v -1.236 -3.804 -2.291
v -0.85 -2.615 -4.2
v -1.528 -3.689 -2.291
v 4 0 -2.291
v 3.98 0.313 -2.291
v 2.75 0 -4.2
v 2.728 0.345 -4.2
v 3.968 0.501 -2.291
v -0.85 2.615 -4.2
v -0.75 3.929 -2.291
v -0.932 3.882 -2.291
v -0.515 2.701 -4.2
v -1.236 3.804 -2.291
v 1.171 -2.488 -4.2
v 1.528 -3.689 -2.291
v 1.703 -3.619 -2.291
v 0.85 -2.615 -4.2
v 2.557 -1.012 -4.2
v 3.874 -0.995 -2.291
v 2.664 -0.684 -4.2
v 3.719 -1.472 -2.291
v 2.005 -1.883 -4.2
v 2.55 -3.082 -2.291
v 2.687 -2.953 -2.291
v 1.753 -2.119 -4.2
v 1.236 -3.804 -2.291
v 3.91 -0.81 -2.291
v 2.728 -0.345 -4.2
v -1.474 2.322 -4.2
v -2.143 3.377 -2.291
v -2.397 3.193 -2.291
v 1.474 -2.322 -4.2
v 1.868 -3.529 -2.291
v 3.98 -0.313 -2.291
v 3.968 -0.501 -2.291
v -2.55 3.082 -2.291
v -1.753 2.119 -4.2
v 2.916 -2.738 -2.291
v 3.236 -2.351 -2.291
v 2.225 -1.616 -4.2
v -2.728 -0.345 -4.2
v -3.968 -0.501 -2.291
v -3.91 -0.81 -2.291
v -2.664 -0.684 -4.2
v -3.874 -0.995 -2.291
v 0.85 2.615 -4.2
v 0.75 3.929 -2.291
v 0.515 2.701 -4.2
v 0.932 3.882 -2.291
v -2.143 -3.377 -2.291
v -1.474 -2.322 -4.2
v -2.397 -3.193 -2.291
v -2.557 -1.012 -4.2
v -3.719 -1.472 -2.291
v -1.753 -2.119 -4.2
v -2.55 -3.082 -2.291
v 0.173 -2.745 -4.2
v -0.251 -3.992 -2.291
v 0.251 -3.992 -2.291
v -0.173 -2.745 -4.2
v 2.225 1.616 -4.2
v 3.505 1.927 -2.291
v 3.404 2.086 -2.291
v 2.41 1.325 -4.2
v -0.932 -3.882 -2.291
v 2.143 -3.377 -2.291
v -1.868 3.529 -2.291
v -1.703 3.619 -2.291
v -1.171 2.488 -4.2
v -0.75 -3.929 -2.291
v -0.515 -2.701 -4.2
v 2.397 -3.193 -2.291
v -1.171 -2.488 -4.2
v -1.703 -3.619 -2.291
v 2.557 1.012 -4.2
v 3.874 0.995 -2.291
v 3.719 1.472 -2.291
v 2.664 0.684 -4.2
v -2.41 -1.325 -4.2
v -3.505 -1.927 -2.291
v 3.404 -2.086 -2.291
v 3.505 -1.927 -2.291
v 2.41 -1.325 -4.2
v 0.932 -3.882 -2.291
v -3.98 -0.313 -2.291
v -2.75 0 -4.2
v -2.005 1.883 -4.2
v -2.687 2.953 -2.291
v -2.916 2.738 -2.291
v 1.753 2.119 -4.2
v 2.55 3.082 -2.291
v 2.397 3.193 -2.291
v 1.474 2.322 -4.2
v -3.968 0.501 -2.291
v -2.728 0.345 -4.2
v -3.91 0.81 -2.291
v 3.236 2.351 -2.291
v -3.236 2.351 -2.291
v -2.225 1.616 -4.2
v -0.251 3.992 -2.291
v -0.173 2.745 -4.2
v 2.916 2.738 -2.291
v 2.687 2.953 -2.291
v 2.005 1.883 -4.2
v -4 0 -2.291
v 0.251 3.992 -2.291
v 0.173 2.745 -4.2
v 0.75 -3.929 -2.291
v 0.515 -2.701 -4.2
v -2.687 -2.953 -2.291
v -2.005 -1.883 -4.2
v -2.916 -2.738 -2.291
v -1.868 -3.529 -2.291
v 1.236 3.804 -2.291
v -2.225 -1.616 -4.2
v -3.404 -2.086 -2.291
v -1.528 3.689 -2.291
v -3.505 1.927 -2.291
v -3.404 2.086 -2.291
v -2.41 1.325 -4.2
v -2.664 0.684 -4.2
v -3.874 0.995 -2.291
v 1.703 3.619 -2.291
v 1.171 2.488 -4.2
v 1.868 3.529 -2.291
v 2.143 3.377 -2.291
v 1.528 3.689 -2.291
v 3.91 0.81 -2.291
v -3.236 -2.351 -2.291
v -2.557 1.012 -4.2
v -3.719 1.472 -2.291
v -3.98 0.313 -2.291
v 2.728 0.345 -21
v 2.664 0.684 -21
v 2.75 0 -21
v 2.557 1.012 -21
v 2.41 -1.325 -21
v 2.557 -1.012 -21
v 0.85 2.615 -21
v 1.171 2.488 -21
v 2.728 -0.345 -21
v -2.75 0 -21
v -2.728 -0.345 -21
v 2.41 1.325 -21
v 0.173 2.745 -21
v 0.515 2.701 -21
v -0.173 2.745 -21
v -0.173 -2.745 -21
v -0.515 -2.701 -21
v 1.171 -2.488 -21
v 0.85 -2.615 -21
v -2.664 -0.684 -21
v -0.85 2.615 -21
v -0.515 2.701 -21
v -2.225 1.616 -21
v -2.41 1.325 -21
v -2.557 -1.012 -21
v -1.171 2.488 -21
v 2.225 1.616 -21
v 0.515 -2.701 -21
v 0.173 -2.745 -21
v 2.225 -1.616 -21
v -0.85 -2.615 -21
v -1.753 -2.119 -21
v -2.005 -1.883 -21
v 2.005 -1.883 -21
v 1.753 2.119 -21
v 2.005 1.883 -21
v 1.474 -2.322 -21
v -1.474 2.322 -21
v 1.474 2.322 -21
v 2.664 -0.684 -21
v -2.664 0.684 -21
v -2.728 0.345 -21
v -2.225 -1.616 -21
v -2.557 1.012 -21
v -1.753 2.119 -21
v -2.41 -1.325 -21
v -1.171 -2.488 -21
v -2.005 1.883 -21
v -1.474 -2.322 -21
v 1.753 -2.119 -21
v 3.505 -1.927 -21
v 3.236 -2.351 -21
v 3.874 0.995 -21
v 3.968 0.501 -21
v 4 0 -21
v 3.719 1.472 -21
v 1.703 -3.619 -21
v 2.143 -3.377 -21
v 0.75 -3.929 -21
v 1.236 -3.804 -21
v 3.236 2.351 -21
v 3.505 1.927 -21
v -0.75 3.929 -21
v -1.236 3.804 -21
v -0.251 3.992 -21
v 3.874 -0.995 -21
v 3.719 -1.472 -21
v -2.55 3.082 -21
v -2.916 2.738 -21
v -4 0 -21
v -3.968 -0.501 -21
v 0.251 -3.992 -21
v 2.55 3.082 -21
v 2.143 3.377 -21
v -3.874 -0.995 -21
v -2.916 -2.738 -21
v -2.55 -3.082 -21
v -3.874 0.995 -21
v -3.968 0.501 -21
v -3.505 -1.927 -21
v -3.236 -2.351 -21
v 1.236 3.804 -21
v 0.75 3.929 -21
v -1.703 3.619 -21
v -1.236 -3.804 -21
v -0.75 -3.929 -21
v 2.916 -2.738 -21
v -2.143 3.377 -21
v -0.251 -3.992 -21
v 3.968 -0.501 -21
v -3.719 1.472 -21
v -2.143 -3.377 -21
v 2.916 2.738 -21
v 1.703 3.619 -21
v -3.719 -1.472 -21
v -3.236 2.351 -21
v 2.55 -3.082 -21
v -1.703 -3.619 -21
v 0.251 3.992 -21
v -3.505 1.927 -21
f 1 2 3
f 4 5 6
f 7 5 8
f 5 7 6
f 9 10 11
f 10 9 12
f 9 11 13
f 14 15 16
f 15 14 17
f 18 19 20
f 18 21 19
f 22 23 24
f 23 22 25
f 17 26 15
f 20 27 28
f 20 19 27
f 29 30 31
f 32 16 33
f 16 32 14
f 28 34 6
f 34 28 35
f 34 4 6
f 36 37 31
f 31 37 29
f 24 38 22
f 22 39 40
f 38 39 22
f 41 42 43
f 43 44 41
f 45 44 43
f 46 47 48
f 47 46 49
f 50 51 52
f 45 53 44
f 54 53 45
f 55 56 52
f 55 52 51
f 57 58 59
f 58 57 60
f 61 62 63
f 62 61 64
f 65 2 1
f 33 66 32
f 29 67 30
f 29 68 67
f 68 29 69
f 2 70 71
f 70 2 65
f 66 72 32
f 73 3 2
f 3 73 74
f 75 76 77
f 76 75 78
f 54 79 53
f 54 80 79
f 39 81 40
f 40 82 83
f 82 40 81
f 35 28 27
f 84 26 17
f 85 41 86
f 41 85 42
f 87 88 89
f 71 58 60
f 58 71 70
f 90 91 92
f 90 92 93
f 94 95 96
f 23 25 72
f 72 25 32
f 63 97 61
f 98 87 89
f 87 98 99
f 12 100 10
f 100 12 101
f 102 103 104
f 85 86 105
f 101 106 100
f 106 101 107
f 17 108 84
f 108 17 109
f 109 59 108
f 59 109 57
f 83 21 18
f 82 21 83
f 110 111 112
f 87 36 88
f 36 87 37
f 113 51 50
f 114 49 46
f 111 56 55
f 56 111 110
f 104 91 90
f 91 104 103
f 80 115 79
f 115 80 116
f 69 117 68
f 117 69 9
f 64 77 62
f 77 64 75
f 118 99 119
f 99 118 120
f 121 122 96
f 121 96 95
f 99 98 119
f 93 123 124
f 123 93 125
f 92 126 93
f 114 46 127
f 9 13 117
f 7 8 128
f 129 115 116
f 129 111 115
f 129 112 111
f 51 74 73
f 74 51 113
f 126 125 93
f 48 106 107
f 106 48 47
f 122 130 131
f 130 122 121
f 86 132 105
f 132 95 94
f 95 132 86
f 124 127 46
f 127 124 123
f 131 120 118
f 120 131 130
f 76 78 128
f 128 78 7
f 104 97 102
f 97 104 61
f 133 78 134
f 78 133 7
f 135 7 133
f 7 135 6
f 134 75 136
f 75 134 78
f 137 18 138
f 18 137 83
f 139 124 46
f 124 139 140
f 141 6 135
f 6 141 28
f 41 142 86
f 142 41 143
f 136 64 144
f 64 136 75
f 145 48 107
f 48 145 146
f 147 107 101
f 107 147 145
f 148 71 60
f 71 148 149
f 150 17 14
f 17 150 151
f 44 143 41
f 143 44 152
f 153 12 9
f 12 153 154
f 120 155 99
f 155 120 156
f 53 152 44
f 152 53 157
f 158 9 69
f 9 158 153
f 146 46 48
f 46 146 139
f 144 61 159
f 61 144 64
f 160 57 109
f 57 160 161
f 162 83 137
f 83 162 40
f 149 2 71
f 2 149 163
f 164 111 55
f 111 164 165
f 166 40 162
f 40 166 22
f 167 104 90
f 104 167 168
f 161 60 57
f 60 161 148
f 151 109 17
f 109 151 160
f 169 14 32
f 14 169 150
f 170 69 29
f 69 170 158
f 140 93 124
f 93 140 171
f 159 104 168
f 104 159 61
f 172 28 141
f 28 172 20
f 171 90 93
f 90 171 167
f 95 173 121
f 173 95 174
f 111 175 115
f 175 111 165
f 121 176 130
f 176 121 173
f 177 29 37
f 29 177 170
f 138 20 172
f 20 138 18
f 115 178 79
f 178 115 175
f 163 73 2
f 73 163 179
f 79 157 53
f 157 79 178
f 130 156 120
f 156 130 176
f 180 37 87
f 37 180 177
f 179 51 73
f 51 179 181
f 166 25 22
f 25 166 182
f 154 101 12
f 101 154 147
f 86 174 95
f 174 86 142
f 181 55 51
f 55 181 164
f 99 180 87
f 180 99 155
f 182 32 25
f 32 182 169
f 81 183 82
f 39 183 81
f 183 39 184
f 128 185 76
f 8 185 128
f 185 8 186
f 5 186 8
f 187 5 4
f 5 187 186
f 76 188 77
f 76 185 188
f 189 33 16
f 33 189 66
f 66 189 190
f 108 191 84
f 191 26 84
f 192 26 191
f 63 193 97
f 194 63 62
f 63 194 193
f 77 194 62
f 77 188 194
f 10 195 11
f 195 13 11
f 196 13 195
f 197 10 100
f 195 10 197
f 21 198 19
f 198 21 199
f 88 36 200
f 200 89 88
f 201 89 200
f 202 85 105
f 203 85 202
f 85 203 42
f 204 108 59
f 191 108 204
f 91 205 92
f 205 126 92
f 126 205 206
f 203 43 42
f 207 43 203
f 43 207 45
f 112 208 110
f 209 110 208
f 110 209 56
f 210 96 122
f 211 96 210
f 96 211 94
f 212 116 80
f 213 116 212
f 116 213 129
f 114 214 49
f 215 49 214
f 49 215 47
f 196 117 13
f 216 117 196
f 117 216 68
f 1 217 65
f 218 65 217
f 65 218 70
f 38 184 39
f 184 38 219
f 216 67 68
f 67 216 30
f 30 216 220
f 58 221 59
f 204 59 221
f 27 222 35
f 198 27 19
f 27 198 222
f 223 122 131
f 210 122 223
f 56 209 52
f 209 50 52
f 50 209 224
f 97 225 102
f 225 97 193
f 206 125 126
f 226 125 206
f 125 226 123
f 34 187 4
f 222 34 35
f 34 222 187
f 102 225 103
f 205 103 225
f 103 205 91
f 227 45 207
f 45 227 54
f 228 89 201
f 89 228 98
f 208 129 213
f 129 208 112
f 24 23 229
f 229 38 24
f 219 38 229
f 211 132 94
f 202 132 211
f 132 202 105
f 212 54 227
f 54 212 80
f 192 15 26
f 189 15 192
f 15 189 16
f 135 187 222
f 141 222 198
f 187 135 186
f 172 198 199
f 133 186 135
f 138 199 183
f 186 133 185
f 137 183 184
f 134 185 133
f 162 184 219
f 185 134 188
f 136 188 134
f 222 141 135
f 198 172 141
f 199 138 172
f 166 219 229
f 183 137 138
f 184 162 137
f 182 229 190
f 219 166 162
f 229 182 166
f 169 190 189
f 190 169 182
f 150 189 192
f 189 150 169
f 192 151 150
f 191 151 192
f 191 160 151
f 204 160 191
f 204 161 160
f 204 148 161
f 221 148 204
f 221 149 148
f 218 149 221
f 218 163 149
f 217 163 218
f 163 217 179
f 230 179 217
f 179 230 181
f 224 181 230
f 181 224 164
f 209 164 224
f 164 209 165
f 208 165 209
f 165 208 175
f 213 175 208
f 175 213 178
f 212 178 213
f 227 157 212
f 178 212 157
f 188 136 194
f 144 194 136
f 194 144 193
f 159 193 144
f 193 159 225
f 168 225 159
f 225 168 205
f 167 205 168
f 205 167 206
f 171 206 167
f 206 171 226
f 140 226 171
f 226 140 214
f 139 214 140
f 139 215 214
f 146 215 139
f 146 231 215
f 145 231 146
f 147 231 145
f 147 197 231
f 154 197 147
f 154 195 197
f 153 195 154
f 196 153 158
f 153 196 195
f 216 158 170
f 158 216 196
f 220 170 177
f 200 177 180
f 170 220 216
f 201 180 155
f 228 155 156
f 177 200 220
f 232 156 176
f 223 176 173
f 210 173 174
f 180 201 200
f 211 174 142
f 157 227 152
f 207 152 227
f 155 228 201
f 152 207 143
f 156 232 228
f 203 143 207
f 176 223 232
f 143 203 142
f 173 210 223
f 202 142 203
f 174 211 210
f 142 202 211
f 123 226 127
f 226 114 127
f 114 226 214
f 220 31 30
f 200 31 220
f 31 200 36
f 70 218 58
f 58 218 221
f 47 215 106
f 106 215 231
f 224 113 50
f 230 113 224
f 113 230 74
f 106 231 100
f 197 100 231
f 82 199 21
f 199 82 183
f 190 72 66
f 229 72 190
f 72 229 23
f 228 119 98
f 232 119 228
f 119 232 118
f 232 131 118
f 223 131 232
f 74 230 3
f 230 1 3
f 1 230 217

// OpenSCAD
$fn = 50;

difference() {
	union() {
		translate(v = [0, 0, -21.0]) {
			cylinder(h = 21, r = 4.0);
		}
	}
	union() {
		translate(v = [0, 0, 0]) {
			rotate(a = [0, 0, 0]) {
				difference() {
					union() {
						translate(v = [0, 0, -24.0]) {
							cylinder(h = 24, r = 2.25);
						}
						translate(v = [0, 0, -4.2]) {
							cylinder(h = 4.2, r1 = 2.75, r2 = 5.5);
						}
						translate(v = [0, 0, -24.0]) {
							cylinder(h = 24, r = 2.75);
						}
						translate(v = [0, 0, -24.0]) {
							cylinder(h = 24, r = 2.25);
						}
					}
					union();
				}
			}
		}
	}
}
